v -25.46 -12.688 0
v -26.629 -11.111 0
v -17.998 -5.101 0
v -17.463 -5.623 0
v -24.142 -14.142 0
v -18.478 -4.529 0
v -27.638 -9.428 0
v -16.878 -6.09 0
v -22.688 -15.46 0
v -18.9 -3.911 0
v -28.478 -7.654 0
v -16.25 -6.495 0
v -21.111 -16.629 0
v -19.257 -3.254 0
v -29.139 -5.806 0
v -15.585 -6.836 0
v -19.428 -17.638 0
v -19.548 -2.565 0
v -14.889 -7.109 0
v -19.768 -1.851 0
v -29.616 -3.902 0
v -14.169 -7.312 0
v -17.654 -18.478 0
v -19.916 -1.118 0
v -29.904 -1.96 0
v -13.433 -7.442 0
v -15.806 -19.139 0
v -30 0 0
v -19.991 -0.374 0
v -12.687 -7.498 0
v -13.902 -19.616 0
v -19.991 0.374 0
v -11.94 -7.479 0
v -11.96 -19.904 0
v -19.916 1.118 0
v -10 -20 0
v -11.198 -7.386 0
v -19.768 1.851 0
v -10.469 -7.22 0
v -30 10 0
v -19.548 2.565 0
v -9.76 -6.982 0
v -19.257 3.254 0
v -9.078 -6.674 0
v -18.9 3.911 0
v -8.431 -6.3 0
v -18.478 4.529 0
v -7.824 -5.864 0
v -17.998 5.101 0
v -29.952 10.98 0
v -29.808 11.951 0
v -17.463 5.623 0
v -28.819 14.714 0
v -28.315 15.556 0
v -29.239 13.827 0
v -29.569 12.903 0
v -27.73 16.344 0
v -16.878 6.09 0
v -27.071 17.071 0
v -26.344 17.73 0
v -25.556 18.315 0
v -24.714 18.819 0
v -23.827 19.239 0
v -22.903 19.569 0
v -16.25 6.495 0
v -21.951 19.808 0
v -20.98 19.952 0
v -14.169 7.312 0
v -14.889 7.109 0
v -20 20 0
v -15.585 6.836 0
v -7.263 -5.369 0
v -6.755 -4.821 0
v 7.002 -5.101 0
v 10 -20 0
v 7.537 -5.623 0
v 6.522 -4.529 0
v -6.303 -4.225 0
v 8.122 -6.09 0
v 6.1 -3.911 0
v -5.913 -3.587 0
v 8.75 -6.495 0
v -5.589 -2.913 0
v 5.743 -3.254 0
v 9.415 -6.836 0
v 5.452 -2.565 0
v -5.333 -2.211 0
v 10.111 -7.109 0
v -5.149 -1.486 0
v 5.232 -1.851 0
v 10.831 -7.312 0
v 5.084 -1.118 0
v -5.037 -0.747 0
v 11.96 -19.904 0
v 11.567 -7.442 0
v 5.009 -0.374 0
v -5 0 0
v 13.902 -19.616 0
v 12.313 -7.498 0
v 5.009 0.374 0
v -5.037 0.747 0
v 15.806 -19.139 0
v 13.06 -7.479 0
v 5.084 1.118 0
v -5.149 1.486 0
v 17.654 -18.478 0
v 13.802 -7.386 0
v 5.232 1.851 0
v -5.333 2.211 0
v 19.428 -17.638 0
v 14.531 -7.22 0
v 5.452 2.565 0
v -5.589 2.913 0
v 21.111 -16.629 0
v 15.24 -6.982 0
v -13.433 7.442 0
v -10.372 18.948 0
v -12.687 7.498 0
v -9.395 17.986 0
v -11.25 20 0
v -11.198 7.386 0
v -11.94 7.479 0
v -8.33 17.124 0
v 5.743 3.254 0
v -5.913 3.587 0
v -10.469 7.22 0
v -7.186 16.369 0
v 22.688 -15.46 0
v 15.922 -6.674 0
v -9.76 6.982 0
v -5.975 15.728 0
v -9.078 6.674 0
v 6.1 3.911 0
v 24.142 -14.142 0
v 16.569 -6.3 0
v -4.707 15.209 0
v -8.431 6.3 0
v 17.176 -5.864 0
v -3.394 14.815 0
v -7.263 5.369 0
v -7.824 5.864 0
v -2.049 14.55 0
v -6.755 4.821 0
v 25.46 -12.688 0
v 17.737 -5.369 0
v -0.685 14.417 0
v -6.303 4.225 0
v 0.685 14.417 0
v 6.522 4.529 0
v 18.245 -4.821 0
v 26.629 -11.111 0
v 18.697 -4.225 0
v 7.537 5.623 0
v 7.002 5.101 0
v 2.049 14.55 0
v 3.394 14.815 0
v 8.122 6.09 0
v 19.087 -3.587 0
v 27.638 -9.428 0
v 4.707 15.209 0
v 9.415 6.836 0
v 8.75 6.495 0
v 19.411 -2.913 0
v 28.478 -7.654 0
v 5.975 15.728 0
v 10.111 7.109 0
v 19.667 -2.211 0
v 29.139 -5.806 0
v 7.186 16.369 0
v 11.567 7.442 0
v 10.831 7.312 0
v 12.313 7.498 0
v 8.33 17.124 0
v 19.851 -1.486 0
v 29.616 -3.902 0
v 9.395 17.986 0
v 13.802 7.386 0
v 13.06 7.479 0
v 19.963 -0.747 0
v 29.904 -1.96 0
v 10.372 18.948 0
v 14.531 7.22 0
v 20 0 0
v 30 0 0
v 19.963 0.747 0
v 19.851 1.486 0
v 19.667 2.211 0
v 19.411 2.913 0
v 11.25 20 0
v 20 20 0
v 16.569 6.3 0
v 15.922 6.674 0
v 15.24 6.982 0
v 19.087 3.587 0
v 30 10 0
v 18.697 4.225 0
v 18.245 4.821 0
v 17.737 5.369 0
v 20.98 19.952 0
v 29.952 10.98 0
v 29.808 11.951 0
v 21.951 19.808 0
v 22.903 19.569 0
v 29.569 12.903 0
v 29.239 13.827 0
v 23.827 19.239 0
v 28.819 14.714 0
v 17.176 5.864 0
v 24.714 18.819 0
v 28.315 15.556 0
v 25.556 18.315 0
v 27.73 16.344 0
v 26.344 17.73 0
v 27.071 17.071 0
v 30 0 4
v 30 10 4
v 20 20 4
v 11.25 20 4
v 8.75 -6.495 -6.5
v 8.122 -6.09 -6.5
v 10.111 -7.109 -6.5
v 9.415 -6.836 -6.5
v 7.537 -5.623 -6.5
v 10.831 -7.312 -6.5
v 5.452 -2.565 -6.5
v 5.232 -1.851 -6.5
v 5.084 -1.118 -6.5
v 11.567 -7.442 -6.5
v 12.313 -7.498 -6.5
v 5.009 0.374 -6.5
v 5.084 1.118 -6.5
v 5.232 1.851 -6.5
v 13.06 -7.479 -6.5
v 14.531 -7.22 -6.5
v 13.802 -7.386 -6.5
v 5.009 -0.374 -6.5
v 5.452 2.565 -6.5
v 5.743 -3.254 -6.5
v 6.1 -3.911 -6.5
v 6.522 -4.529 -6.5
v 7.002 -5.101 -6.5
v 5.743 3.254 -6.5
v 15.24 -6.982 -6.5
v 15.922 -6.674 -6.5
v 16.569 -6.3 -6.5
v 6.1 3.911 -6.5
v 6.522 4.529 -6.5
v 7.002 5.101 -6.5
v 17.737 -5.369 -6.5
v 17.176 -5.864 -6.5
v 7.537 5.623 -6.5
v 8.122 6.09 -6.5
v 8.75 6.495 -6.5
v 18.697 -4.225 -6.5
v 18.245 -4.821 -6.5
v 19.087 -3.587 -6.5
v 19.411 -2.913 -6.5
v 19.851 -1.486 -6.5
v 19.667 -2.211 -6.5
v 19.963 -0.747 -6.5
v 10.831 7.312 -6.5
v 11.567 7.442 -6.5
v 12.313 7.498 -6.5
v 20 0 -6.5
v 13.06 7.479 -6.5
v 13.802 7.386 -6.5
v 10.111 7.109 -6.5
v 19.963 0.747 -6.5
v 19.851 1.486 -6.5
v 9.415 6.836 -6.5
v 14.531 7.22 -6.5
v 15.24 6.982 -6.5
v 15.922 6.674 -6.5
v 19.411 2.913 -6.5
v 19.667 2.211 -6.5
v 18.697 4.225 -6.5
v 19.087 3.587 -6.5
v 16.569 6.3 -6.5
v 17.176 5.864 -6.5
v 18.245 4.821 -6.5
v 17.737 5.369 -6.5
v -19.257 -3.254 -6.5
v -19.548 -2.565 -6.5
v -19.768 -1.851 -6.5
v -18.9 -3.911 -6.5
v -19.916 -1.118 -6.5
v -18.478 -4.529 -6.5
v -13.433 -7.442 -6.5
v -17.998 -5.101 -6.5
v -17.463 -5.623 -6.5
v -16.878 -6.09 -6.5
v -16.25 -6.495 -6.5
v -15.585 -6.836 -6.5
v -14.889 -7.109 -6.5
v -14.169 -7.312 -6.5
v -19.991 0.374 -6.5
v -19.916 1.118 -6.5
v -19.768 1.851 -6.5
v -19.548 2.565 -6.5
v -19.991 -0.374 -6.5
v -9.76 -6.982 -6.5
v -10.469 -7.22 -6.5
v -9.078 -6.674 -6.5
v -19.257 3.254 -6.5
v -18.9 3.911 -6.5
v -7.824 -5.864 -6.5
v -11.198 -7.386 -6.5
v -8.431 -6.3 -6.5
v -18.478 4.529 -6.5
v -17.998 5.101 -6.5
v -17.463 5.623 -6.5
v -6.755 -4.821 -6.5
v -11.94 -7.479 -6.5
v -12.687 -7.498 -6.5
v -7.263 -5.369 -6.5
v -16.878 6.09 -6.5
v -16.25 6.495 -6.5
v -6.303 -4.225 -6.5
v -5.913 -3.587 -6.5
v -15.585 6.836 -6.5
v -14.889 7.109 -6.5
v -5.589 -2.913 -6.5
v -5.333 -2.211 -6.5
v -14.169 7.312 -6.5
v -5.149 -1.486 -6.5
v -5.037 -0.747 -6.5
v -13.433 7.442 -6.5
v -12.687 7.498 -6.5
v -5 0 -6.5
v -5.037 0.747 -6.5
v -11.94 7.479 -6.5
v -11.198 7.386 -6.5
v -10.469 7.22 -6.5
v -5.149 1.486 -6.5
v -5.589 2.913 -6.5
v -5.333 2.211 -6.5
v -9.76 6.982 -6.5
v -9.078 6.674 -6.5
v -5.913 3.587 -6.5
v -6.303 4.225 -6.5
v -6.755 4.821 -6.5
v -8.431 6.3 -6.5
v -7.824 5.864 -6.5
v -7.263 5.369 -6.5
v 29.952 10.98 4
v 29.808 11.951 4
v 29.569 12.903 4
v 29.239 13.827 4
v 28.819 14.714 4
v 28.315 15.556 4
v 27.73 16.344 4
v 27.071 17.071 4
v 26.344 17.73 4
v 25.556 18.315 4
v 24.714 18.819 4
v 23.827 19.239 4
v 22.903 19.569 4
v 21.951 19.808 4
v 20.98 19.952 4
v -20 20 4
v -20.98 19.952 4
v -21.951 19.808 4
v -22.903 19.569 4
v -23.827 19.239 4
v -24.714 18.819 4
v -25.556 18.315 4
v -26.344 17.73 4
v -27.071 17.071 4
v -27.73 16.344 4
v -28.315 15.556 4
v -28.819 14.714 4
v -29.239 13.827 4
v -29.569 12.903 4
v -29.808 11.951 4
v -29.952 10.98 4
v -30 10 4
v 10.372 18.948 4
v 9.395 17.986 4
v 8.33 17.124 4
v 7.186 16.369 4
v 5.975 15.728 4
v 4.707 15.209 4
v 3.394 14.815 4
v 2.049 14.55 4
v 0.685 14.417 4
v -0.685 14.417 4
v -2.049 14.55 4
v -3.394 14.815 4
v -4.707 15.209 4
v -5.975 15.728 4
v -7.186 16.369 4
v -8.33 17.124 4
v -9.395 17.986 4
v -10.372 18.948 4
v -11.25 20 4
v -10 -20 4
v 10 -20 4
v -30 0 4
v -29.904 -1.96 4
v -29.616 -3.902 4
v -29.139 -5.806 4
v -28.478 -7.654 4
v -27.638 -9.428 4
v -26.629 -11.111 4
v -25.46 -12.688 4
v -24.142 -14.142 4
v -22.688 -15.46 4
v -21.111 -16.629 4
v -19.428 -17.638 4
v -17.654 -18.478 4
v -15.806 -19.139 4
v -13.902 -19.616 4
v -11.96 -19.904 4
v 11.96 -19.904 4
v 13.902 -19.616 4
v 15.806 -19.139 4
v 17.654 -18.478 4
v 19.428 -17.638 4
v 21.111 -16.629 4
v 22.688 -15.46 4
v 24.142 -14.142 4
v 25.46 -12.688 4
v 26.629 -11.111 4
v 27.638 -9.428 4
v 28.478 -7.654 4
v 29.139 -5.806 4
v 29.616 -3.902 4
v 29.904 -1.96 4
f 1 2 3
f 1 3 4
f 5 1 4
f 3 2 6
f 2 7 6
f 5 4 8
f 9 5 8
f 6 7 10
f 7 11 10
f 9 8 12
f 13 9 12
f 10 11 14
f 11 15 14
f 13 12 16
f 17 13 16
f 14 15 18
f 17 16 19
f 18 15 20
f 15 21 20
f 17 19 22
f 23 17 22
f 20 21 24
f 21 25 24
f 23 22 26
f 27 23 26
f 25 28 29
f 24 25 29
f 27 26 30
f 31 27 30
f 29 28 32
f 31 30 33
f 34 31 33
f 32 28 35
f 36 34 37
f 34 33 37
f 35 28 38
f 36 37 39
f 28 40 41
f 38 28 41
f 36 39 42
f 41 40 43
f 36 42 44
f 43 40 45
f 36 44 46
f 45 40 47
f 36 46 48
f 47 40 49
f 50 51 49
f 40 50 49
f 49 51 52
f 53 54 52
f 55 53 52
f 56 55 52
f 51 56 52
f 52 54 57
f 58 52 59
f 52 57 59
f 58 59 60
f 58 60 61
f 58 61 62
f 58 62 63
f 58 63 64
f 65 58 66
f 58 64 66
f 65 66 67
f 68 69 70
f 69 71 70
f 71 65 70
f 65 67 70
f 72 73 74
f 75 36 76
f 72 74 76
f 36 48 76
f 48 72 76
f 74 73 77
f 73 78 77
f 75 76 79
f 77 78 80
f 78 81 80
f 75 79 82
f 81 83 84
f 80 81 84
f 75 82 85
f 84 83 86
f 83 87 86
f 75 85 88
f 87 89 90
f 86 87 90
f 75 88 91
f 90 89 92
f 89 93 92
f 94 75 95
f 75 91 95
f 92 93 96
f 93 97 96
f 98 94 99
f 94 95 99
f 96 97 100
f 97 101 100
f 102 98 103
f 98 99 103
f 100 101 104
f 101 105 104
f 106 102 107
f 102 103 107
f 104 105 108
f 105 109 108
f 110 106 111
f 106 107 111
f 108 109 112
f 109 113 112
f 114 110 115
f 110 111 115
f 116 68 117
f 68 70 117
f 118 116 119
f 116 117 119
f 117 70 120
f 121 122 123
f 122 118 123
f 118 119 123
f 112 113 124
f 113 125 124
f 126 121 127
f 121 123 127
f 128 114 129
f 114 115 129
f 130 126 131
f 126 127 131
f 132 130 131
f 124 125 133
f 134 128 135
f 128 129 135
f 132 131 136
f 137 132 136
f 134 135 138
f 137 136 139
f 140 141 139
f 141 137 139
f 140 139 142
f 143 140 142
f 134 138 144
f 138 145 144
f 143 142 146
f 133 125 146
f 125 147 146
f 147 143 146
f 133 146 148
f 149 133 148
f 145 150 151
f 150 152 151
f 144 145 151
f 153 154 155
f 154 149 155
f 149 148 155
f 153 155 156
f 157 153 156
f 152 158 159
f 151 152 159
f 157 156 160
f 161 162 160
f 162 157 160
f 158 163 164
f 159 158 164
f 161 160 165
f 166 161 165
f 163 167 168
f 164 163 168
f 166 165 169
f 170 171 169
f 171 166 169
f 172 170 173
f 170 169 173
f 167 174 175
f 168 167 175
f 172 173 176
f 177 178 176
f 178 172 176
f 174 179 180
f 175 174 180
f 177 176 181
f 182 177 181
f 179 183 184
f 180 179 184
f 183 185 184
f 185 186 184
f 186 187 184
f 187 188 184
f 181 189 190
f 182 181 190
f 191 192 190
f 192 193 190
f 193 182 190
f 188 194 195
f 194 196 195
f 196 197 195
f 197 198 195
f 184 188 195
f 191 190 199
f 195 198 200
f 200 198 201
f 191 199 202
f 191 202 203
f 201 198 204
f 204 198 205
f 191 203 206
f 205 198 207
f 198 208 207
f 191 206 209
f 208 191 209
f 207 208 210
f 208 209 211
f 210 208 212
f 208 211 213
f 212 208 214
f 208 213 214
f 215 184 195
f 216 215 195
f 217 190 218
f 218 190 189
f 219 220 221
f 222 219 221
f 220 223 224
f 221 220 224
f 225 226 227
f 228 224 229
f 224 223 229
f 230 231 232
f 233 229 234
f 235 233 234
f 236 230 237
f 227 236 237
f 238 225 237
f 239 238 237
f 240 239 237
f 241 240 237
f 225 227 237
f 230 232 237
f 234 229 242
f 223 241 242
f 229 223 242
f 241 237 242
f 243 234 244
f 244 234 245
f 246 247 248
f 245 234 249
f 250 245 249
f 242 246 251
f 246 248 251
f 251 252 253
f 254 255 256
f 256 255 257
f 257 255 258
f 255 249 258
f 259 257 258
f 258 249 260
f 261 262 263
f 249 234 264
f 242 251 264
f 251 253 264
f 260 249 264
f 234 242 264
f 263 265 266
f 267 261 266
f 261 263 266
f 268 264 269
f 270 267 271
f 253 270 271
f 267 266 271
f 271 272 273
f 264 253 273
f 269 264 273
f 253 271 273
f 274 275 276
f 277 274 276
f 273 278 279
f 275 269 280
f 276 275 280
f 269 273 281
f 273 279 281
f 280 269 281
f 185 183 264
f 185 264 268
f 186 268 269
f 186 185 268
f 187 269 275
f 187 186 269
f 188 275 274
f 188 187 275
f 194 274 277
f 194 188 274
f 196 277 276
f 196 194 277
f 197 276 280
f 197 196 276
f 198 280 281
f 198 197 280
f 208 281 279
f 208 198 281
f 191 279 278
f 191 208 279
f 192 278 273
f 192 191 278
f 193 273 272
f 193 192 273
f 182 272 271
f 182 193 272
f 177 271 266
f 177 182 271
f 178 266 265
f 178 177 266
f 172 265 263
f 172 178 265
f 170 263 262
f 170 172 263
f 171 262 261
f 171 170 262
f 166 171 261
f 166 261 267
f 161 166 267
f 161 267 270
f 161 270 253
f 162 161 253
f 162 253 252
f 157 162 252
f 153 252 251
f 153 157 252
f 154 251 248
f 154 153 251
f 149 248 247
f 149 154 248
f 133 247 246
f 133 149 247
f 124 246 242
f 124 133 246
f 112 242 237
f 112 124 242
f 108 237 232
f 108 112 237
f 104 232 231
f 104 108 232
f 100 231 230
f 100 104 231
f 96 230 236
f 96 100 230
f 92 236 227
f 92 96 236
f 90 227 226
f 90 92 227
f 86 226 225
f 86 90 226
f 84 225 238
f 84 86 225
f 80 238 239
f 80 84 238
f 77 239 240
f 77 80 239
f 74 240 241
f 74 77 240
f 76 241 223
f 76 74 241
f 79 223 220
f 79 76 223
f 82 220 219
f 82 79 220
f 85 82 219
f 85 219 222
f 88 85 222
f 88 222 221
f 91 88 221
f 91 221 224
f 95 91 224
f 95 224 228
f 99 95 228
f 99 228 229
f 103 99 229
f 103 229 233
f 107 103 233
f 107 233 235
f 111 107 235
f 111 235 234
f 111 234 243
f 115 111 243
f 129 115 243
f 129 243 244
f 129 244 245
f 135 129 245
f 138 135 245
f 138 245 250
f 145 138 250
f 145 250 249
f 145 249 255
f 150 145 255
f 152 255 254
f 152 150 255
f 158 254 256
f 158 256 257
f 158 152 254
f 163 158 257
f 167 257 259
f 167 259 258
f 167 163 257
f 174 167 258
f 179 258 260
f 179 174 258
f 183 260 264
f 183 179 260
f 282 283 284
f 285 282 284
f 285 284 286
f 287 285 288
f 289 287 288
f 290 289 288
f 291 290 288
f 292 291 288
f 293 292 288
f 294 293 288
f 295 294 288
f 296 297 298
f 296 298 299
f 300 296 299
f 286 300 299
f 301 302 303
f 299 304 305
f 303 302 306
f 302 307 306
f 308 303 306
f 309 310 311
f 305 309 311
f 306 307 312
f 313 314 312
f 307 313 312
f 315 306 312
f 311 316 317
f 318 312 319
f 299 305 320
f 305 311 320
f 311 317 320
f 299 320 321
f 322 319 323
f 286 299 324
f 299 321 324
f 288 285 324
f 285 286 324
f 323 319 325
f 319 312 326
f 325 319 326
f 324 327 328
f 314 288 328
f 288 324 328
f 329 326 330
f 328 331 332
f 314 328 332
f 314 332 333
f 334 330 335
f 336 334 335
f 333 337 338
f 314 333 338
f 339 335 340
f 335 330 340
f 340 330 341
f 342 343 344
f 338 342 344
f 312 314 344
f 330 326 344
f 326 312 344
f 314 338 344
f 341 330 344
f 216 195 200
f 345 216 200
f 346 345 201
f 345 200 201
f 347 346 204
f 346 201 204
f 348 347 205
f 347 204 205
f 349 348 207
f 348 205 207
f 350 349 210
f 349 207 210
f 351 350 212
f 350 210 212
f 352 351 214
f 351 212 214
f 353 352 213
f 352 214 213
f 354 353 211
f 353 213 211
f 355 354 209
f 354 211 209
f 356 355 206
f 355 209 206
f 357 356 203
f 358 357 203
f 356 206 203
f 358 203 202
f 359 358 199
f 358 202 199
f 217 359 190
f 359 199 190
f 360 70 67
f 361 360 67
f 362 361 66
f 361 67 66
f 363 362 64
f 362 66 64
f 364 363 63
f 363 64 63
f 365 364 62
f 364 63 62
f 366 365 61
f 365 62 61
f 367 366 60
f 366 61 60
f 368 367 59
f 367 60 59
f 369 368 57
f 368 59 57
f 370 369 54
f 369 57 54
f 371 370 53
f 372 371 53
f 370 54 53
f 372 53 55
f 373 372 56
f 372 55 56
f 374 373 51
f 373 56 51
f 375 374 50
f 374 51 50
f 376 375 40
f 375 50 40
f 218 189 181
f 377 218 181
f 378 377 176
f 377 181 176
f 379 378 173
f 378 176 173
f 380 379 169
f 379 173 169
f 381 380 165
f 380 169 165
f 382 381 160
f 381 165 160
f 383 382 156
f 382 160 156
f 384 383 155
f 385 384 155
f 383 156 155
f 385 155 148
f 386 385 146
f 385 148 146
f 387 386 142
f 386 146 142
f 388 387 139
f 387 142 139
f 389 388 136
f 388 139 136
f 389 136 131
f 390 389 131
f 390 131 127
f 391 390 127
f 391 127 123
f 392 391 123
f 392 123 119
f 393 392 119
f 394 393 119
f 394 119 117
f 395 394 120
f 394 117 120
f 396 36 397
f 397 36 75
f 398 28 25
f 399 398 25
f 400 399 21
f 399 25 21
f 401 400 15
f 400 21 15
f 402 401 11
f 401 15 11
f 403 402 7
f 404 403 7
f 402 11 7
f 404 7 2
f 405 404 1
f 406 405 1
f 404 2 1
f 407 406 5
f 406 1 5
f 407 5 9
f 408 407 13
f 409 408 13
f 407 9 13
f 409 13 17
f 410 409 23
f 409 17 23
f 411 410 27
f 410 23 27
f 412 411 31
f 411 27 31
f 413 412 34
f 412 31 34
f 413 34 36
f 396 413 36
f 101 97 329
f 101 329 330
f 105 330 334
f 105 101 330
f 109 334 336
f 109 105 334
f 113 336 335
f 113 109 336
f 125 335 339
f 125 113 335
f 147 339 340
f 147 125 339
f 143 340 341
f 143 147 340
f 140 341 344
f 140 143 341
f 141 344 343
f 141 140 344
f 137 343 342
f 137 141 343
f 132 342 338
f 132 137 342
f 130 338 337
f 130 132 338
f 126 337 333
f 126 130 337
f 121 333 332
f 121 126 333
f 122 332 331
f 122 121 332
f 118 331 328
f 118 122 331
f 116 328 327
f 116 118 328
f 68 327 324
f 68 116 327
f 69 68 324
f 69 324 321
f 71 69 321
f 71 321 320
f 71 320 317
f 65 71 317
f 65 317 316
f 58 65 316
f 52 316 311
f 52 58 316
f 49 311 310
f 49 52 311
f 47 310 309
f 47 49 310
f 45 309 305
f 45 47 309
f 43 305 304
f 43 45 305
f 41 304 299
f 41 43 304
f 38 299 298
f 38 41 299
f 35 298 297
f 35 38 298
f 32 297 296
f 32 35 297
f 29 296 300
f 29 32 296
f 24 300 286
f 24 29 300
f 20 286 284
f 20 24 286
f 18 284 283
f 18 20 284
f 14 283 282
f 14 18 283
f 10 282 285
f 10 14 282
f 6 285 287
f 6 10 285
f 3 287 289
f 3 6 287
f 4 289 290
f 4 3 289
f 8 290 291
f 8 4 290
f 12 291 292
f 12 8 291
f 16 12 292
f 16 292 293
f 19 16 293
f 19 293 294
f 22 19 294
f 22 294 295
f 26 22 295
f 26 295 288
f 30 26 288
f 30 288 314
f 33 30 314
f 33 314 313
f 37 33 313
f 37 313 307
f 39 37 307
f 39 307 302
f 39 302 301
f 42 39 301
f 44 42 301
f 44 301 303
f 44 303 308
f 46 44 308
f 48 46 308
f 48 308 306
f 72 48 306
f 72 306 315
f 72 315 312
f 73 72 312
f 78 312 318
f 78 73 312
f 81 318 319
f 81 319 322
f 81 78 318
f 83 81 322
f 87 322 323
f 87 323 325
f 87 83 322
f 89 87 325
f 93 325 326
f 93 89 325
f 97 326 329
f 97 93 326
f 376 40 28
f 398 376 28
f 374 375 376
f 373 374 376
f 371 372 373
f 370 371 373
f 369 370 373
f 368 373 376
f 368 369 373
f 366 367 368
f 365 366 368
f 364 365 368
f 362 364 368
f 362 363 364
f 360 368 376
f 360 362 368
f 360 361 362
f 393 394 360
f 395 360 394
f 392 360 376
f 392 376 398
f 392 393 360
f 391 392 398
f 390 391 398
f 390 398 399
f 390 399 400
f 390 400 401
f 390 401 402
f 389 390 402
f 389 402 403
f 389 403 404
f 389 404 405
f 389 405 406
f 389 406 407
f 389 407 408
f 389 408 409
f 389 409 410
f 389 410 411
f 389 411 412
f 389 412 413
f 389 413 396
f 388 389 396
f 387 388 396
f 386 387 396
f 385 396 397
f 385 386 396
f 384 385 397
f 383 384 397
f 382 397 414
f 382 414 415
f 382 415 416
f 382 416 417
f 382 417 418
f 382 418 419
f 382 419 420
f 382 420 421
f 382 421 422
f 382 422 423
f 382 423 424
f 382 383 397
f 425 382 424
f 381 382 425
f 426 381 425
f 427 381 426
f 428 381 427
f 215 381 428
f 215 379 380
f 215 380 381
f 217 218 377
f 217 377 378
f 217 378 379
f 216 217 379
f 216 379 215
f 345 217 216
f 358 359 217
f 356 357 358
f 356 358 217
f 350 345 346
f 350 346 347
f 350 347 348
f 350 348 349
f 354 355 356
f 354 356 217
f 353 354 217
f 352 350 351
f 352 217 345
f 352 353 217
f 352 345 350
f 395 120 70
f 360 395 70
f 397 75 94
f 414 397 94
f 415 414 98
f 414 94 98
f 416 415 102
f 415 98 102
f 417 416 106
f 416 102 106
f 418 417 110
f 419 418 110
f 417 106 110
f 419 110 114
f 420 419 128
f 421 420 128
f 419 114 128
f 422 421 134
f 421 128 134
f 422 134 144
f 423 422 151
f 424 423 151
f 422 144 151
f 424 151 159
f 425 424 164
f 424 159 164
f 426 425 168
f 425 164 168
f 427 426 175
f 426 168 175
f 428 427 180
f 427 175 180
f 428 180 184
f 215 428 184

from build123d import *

# Parameters (mm, degrees)
EXTRUDE_1_DEPTH = 4
SKETCH_3_R      = 7.5
EXTRUDE_2_DEPTH = 6.5


with BuildPart() as part:
    # 草图1 → 凸台-拉伸1 (new body)
    with BuildSketch(Plane.XY):
        with BuildLine():
            Line((-10, -20), (10, -20))
            ThreePointArc((10, -20), (24.142135624, -14.142135624), (30, 0))
            Line((30, 0), (30, 10))
            ThreePointArc((30, 10), (27.071067812, 17.071067812), (20, 20))
            Line((20, 20), (11.249888888, 20))
            ThreePointArc((11.249888888, 20), (0, 14.4), (-11.249888888, 20))
            Line((-11.249888888, 20), (-20, 20))
            ThreePointArc((-20, 20), (-27.071067812, 17.071067812), (-30, 10))
            Line((-30, 10), (-30, 0))
            ThreePointArc((-30, 0), (-24.142135624, -14.142135624), (-10, -20))
        make_face()
    extrude(amount=EXTRUDE_1_DEPTH)

    # 草图3 → 凸台-拉伸2 (add)
    with BuildSketch(Plane.XY):
        with Locations((-12.5, 0)):
            Circle(SKETCH_3_R)
        with Locations((12.5, 0)):
            Circle(SKETCH_3_R)
    extrude(amount=-EXTRUDE_2_DEPTH)


solid = part.part
